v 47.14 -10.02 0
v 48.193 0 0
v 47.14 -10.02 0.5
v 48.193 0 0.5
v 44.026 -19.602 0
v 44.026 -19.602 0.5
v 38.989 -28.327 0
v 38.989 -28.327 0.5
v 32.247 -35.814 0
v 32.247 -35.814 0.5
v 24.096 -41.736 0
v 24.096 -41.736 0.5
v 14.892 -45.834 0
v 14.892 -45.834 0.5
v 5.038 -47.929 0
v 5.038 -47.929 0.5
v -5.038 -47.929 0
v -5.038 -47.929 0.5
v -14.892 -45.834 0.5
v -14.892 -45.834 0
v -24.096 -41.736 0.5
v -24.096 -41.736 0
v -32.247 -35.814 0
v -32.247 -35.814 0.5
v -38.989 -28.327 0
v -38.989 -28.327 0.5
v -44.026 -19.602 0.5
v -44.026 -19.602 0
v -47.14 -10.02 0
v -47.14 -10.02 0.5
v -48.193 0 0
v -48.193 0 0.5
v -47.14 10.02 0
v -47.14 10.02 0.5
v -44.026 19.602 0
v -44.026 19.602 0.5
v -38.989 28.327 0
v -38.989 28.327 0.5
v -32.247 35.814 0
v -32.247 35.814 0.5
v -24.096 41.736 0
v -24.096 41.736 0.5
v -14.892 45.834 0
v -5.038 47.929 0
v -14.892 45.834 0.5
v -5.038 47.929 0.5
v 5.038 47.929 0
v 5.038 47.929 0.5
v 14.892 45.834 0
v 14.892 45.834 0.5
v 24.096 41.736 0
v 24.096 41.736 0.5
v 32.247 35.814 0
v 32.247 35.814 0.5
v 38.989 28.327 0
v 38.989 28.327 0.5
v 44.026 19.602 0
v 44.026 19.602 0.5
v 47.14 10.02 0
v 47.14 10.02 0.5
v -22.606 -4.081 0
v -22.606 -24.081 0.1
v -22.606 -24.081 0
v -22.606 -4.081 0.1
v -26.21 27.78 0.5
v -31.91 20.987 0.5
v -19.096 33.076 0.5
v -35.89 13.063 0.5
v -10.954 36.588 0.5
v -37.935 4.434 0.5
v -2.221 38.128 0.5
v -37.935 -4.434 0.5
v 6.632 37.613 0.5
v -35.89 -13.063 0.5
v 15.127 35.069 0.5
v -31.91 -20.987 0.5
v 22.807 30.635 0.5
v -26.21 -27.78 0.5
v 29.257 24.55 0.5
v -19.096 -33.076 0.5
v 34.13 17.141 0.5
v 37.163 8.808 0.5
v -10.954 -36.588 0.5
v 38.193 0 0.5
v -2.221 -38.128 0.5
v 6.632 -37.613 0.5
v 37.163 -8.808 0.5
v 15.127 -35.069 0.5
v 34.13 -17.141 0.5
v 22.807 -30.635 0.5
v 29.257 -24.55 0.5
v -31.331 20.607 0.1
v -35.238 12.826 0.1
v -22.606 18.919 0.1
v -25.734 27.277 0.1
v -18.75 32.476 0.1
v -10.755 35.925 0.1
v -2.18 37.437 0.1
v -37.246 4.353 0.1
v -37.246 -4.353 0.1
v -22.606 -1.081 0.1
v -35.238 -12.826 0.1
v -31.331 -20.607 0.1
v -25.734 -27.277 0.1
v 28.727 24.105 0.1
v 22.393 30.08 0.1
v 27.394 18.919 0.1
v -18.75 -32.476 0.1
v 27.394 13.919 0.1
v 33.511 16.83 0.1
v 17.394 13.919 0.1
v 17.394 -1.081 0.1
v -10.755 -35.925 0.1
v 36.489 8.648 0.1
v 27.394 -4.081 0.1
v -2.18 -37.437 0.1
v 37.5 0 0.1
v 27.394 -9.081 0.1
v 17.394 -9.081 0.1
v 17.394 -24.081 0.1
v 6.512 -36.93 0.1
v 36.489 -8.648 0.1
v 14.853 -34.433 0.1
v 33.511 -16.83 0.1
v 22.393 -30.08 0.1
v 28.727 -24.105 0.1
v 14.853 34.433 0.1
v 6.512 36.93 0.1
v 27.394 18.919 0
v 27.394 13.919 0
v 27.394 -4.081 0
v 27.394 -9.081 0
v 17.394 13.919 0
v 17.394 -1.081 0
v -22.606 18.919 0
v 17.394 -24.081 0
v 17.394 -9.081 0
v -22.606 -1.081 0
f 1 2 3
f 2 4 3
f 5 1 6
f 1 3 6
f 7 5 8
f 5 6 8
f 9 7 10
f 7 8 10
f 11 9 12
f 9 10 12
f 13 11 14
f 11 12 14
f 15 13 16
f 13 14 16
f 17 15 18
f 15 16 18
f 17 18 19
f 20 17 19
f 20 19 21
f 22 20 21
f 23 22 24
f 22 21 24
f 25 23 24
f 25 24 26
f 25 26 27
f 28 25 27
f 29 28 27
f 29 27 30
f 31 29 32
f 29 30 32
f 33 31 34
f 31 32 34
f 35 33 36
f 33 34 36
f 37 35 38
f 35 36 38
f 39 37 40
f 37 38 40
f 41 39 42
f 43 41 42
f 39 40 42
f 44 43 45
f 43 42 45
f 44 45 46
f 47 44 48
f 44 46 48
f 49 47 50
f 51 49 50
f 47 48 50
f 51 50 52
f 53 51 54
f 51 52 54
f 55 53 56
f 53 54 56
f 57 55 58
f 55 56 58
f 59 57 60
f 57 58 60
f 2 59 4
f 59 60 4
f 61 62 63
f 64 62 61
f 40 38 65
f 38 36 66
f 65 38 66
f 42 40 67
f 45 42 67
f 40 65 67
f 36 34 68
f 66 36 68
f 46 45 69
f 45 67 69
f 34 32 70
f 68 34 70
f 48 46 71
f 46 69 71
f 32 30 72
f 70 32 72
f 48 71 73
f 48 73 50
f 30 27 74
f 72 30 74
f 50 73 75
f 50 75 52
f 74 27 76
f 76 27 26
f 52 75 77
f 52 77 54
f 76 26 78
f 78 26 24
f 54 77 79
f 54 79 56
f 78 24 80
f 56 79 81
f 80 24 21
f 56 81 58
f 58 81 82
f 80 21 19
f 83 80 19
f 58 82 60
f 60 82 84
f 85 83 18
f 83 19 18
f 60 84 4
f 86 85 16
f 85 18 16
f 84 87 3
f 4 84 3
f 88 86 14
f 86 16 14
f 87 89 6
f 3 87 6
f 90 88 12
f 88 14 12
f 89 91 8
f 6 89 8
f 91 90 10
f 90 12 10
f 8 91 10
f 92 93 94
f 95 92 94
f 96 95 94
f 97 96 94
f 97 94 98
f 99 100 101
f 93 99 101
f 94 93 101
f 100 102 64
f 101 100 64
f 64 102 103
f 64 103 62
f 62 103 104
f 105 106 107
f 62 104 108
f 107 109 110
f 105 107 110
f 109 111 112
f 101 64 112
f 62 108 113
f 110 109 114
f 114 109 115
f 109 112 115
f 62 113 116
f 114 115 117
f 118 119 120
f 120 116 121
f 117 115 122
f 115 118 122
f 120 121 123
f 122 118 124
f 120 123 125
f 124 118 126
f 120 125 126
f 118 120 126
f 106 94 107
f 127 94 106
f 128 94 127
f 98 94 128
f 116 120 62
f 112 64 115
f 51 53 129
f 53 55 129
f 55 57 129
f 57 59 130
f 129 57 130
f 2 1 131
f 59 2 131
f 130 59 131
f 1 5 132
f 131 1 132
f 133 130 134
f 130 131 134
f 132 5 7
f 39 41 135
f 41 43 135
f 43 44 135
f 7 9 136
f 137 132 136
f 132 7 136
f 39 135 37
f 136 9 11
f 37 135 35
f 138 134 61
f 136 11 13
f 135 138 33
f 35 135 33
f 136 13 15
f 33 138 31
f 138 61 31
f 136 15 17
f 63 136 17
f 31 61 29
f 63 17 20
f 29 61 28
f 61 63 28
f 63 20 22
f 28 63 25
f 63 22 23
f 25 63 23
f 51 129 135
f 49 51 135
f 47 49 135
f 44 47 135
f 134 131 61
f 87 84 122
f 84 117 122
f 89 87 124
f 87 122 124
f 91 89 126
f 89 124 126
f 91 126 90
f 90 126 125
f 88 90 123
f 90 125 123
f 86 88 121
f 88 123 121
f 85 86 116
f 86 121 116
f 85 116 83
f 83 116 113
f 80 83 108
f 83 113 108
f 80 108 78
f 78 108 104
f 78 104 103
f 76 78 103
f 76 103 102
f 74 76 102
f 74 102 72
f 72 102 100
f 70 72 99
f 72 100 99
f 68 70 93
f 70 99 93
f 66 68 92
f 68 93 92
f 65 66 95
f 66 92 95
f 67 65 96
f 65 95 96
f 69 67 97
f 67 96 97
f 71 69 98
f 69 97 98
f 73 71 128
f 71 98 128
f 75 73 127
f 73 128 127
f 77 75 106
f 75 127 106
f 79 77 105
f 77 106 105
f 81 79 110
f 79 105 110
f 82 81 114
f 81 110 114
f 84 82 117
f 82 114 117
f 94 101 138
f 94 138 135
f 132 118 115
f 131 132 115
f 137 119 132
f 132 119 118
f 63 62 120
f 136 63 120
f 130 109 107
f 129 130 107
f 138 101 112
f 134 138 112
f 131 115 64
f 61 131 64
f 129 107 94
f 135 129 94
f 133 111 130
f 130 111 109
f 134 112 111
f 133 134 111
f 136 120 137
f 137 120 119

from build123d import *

# Parameters (mm, degrees)
CUT_EXTRUDE1_DEPTH = 69.156113896


with BuildPart() as part:
    # Sketch2 → Revolve1 (revolve)
    with BuildSketch(Plane.YZ):
        Polygon((48.192820323, 0.5), (38.192820323, 0.5), (37.5, 0.1), (0, 0.1), (0, 0), (48.192820323, 0), align=None)
    revolve(axis=Axis((0, 0, 0.1), (0, 0, -1)))

    # Sketch3 → Cut-Extrude1 (cut, through all)
    with BuildSketch(Plane.XY.offset(0.1)):
        Polygon((-22.605575449, 18.919047288), (-22.605575449, -1.080952712), (17.394424551, -1.080952712), (17.394424551, 13.919047288), (27.394424551, 13.919047288), (27.394424551, 18.919047288), align=None)
        Polygon((-22.605575449, -4.080952712), (-22.605575449, -24.080952712), (17.394424551, -24.080952712), (17.394424551, -9.080952712), (27.394424551, -9.080952712), (27.394424551, -4.080952712), align=None)
    extrude(amount=-CUT_EXTRUDE1_DEPTH, mode=Mode.SUBTRACT)


solid = part.part
